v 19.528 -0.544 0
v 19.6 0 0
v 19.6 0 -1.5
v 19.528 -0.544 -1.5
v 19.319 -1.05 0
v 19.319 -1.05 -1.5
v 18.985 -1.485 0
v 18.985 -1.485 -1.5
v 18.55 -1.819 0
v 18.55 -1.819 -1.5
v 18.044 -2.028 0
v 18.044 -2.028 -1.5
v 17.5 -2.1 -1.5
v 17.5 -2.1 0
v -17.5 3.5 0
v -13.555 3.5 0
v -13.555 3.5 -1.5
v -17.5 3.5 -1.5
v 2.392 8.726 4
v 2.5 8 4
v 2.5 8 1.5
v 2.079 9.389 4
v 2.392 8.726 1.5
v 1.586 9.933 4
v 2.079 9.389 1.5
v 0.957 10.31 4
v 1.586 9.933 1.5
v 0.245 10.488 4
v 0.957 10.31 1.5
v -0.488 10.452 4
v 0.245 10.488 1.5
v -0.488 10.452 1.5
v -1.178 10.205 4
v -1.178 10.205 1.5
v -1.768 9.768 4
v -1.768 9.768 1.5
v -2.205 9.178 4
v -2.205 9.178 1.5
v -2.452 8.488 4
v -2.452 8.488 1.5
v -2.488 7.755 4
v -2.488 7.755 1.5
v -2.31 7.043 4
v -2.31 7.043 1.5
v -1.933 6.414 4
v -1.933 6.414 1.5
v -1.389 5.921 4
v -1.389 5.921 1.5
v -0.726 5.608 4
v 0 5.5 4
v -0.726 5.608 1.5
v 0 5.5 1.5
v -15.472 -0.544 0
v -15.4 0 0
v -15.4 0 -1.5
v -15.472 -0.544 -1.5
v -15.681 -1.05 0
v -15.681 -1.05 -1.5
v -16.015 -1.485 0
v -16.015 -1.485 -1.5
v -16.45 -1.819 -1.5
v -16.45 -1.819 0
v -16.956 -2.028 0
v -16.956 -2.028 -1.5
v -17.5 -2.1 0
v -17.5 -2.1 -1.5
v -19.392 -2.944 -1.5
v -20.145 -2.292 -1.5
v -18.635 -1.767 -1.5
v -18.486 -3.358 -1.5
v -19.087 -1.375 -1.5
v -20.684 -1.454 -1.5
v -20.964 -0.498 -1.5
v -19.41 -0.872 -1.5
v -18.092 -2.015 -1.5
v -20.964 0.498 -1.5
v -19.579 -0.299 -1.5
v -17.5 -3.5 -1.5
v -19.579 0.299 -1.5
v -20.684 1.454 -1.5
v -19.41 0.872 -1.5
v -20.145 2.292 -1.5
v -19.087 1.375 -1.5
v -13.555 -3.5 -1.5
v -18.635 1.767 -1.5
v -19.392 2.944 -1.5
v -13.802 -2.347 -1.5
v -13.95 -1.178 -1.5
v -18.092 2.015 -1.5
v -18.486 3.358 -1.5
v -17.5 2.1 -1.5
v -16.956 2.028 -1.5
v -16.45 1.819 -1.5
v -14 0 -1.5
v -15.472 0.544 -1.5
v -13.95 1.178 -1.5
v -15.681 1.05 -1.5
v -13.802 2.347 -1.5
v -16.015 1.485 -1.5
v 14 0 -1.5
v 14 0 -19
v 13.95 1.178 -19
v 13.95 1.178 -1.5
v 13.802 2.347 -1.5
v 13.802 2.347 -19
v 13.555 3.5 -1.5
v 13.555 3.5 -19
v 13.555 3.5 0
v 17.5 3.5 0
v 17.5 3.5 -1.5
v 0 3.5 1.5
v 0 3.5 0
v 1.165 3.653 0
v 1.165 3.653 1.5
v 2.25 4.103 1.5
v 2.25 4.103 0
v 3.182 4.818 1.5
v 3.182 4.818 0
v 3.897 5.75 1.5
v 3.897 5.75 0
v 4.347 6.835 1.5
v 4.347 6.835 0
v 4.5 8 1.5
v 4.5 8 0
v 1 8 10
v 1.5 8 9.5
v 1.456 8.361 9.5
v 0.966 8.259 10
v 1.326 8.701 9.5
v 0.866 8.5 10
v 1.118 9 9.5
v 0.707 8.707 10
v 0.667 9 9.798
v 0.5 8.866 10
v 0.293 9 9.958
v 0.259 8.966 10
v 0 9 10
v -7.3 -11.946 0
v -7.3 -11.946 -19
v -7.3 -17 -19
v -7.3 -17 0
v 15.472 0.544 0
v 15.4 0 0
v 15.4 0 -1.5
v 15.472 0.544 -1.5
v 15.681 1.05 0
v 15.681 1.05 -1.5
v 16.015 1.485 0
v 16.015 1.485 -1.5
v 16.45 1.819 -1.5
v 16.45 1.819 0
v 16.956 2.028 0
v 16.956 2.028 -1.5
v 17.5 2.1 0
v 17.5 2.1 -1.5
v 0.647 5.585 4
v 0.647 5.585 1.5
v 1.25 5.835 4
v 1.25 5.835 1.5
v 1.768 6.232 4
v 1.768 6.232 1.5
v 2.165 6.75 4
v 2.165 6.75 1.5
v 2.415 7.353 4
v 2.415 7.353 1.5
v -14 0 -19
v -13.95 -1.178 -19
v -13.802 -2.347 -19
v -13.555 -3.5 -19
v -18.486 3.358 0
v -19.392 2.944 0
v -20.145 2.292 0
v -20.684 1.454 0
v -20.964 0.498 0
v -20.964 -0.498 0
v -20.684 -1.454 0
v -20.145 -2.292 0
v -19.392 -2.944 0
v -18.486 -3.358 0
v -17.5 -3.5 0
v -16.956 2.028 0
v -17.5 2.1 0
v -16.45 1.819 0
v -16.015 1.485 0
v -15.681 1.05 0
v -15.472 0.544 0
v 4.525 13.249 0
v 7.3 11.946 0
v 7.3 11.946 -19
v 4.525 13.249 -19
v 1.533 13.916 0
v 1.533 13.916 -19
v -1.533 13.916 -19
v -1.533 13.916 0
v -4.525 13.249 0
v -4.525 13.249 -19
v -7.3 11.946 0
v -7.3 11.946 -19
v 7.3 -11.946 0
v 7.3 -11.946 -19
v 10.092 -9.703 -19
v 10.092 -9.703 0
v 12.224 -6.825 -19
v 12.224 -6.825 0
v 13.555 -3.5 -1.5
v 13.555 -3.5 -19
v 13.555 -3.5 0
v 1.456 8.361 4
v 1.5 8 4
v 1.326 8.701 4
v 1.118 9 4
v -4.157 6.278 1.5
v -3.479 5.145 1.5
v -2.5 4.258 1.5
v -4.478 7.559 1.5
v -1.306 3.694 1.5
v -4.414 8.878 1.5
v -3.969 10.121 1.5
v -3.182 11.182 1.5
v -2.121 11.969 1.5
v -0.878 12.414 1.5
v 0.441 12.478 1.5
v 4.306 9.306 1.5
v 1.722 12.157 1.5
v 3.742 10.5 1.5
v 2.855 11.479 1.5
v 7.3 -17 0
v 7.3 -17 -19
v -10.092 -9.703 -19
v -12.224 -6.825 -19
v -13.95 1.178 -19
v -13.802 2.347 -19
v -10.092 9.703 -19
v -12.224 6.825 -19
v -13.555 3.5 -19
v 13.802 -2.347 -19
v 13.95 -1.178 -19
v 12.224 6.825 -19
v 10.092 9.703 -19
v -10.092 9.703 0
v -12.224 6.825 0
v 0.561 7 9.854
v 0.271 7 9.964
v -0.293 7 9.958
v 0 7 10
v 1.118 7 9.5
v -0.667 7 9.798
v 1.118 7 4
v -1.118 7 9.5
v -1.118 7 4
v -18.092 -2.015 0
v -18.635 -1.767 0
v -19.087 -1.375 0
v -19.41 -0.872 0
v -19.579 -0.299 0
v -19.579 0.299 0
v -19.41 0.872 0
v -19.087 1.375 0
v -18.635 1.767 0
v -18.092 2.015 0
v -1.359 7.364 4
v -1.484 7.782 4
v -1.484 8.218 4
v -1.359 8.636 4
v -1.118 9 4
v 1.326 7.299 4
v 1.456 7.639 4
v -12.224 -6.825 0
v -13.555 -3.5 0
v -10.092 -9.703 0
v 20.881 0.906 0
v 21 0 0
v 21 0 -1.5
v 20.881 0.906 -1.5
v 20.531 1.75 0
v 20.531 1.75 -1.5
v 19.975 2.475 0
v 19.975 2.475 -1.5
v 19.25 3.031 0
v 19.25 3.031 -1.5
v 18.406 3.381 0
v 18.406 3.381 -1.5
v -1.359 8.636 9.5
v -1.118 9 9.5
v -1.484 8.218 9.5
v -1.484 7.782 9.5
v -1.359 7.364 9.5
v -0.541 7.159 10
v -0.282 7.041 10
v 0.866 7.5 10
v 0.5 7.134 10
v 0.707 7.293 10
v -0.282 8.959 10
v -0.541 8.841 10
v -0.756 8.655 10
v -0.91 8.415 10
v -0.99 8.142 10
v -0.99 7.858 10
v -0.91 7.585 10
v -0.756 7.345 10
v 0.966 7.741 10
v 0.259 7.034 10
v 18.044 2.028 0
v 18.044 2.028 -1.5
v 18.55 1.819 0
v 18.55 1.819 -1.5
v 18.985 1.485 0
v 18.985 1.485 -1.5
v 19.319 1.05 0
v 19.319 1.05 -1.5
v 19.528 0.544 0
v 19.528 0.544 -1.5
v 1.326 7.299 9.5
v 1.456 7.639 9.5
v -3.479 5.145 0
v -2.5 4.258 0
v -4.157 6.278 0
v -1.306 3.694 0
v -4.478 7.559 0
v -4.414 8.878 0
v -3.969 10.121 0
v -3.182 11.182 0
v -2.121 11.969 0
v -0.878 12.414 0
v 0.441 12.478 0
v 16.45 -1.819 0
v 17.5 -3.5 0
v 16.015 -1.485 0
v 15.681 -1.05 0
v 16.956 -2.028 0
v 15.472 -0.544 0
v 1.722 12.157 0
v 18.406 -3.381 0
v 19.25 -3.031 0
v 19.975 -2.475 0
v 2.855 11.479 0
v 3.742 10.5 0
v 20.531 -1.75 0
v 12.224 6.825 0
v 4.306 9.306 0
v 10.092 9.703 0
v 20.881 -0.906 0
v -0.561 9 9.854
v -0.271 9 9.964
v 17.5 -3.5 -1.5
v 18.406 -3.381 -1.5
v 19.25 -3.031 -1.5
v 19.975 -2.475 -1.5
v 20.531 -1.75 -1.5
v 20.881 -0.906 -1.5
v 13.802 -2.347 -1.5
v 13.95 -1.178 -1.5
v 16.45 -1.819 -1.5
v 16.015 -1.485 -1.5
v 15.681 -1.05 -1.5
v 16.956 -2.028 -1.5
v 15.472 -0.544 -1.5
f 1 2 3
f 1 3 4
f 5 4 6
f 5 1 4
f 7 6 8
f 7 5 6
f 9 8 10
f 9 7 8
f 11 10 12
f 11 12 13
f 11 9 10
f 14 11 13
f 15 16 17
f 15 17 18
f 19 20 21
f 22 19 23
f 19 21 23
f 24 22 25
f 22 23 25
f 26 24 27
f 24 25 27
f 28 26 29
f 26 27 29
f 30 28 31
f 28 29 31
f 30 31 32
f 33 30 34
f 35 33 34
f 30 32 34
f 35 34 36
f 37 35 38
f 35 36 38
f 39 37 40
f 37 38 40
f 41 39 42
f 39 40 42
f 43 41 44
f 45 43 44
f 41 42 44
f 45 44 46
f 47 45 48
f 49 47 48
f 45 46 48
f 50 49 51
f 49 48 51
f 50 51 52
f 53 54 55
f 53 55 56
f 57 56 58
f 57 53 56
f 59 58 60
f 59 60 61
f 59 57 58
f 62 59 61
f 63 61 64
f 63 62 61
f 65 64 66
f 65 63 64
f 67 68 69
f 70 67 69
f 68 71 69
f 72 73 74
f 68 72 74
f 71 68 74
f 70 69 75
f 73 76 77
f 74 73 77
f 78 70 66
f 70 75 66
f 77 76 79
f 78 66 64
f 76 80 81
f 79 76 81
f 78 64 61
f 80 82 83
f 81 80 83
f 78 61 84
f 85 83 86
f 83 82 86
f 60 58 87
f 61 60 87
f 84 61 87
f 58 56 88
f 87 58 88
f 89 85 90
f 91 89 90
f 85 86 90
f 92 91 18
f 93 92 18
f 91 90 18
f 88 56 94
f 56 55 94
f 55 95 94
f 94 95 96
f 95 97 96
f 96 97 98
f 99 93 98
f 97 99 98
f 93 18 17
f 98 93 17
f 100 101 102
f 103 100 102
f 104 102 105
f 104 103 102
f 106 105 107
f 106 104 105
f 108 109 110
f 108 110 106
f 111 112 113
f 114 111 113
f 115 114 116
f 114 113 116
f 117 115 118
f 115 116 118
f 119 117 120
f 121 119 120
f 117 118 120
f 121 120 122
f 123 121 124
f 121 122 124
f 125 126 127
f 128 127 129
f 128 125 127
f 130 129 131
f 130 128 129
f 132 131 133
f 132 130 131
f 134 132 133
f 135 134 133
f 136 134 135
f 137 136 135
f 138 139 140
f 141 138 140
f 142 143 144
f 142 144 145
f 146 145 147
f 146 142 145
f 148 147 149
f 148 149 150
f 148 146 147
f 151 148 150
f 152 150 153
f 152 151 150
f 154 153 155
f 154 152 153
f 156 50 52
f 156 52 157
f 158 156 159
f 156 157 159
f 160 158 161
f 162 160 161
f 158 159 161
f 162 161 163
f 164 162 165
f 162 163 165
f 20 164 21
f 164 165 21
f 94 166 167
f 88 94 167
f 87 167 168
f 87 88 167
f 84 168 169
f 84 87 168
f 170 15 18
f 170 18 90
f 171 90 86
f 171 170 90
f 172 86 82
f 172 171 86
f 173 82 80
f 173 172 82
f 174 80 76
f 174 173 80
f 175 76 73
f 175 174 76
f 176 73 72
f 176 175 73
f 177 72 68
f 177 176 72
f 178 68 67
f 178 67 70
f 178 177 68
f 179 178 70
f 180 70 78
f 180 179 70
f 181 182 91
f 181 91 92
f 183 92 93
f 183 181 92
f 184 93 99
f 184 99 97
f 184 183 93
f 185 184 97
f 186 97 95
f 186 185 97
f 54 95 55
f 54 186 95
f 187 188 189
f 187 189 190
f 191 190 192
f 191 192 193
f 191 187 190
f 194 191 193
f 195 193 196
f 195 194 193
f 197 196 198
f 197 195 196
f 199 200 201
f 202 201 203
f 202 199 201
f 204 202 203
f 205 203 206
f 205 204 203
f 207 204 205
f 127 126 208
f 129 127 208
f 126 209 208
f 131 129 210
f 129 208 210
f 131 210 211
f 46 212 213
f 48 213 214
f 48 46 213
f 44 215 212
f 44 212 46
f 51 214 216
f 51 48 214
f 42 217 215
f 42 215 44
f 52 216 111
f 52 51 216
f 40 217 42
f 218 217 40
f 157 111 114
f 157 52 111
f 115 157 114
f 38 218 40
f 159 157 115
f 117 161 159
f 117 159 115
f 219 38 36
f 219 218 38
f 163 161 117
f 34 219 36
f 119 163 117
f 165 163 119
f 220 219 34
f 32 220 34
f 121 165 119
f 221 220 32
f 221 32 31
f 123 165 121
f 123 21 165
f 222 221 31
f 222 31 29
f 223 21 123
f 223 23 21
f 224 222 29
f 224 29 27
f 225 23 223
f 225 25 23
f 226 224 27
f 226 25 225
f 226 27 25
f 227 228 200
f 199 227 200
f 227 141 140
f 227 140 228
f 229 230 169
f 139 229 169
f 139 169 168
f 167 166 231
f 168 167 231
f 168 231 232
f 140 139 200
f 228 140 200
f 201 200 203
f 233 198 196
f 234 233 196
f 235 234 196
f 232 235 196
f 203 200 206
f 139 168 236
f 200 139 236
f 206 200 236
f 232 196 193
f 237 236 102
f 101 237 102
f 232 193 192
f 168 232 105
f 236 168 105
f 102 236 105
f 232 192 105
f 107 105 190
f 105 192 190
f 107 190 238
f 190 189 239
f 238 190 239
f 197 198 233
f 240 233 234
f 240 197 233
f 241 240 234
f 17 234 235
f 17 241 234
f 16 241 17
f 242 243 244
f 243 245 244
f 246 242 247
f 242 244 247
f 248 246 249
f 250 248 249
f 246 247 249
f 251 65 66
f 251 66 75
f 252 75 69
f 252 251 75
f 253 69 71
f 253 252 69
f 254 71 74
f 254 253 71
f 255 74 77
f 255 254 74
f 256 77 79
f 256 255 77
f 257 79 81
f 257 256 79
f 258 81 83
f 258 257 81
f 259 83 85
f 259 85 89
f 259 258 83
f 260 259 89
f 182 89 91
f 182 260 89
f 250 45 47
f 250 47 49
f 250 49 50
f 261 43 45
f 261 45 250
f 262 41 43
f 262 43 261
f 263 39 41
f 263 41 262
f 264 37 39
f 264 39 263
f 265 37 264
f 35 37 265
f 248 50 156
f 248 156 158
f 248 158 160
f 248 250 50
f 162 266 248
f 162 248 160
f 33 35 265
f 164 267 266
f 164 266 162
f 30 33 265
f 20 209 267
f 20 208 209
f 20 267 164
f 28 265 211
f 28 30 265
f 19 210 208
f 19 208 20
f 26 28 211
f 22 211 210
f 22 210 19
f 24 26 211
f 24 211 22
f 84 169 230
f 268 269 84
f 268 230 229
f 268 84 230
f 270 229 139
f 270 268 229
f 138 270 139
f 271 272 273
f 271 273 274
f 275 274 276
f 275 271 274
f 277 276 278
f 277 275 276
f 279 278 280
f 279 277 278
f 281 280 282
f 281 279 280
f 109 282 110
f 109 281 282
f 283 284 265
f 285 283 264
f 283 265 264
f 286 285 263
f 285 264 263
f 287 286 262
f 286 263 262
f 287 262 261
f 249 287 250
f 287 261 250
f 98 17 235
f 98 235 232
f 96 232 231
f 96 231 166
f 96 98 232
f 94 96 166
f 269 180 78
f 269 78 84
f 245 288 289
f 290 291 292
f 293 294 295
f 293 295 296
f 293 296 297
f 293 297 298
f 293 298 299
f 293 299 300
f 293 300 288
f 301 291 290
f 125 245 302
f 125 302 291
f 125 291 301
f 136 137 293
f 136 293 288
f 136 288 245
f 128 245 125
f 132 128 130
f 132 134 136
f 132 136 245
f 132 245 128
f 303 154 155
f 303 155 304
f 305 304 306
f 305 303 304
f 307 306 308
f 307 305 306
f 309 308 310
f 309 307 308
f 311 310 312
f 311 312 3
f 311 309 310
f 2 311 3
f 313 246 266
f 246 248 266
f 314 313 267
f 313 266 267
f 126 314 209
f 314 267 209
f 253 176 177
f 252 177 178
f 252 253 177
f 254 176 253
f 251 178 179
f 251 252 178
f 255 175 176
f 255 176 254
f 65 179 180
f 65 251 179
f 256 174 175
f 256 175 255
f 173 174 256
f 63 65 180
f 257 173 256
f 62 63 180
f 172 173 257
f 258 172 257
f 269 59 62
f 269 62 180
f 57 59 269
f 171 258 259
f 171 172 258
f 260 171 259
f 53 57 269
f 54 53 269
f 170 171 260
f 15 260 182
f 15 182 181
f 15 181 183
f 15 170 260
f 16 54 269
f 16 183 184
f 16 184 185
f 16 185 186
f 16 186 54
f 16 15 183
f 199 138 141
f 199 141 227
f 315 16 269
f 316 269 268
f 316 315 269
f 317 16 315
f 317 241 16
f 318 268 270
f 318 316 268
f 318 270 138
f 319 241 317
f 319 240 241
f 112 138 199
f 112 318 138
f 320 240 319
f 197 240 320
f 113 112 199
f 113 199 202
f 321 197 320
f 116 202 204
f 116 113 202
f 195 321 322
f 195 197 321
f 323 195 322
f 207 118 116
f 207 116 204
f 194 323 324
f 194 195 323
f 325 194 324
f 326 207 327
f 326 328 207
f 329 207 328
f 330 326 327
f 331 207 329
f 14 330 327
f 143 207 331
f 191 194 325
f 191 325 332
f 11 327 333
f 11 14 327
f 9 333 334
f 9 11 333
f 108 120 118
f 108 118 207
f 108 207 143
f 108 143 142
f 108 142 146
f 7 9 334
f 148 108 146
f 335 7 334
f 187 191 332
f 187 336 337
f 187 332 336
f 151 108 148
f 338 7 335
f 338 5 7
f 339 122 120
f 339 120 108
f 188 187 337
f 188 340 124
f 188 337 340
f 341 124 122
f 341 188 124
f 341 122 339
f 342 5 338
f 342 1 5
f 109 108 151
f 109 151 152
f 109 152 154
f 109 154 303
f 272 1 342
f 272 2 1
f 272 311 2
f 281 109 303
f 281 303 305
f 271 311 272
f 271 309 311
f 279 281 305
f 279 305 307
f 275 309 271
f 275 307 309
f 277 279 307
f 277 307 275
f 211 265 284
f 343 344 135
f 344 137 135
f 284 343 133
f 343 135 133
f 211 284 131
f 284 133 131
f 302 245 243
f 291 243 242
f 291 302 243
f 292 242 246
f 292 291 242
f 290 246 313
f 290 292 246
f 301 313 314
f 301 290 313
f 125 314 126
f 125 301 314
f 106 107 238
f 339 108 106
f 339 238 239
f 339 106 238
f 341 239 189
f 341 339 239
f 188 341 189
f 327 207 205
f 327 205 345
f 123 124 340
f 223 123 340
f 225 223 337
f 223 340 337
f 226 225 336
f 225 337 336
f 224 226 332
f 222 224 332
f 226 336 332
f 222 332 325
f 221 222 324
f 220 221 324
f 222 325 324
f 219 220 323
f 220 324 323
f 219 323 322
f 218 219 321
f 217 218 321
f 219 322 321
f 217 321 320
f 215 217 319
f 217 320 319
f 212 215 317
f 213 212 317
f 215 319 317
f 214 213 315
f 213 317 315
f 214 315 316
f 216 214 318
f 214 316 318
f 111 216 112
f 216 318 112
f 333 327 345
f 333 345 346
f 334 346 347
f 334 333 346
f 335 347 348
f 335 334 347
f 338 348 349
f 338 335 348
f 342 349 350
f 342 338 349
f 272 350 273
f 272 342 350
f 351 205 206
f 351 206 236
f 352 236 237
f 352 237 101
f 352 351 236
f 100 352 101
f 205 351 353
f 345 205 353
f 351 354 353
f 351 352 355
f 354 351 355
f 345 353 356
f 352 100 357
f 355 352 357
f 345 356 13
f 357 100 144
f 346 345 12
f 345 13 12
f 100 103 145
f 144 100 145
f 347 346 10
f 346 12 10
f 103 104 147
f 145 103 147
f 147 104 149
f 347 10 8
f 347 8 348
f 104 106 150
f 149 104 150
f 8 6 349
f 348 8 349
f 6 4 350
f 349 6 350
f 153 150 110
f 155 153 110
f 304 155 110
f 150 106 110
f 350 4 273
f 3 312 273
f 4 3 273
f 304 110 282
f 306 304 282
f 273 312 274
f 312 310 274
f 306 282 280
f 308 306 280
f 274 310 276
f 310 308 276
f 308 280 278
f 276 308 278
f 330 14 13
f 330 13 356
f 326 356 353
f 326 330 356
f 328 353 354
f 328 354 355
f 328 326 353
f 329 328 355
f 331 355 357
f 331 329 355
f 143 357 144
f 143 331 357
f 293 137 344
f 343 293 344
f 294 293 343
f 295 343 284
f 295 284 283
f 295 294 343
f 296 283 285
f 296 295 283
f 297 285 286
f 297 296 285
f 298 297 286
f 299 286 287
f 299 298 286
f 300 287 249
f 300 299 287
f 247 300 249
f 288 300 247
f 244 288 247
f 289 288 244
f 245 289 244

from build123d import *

# Parameters (mm, degrees)
F0_W     = 7.3
F0_H     = 3.5
F1_DEPTH = 19
F2_DEPTH = 1.5
F3_DEPTH = 10
F4_DEPTH = 4
F5_DEPTH = 1.5
F6_SIZE  = 0.5
F8_DEPTH = 6


with BuildPart() as f1:
    # F0 (on Top) → F1 (new body)
    with BuildSketch(Plane.XY):
        with BuildLine():
            ThreePointArc((7.3, -11.9461290802), (11.250406053, -8.3323684294), (13.5554417117, -3.5))
            Line((13.5554417117, -3.5), (7.3, -3.5))
            Line((7.3, -3.5), (7.3, -11.9461290802))
        make_face()
        with BuildLine():
            ThreePointArc((-7.3, -11.9461290802), (0, -14), (7.3, -11.9461290802))
            Line((7.3, -11.9461290802), (7.3, -3.5))
            Line((7.3, -3.5), (-7.3, -3.5))
            Line((-7.3, -3.5), (-7.3, -11.9461290802))
        make_face()
        with BuildLine():
            ThreePointArc((-13.5554417117, -3.5), (-11.250406053, -8.3323684294), (-7.3, -11.9461290802))
            Line((-7.3, -11.9461290802), (-7.3, -3.5))
            Line((-7.3, -3.5), (-13.5554417117, -3.5))
        make_face()
        with BuildLine():
            Line((-13.5554417117, -3.5), (-7.3, -3.5))
            Line((-7.3, -3.5), (-7.3, 0))
            Line((-7.3, 0), (-14, 0))
            ThreePointArc((-14, 0), (-13.8884157477, -1.7640600948), (-13.5554417117, -3.5))
        make_face()
        with BuildLine():
            Line((-14, 0), (-7.3, 0))
            Line((-7.3, 0), (-7.3, 3.5))
            Line((-7.3, 3.5), (-13.5554417117, 3.5))
            ThreePointArc((-13.5554417117, 3.5), (-13.8884157477, 1.7640600948), (-14, 0))
        make_face()
        with BuildLine():
            Line((-7.3, 3.5), (-7.3, 11.9461290802))
            ThreePointArc((-7.3, 11.9461290802), (-11.250406053, 8.3323684294), (-13.5554417117, 3.5))
            Line((-13.5554417117, 3.5), (-7.3, 3.5))
        make_face()
        with BuildLine():
            Line((7.3, 3.5), (7.3, 11.9461290802))
            ThreePointArc((7.3, 11.9461290802), (0, 14), (-7.3, 11.9461290802))
            Line((-7.3, 11.9461290802), (-7.3, 3.5))
            Line((-7.3, 3.5), (0, 3.5))
            Line((0, 3.5), (7.3, 3.5))
        make_face()
        with BuildLine():
            ThreePointArc((4.5, 8), (3.1819805153, 4.8180194847), (0, 3.5))
            ThreePointArc((0, 3.5), (-3.1819805153, 11.1819805153), (4.5, 8))
        make_face(mode=Mode.SUBTRACT)
        with BuildLine():
            Line((7.3, 3.5), (13.5554417117, 3.5))
            ThreePointArc((13.5554417117, 3.5), (11.250406053, 8.3323684294), (7.3, 11.9461290802))
            Line((7.3, 11.9461290802), (7.3, 3.5))
        make_face()
        with BuildLine():
            Line((7.3, 0), (14, 0))
            ThreePointArc((14, 0), (13.8884157477, 1.7640600948), (13.5554417117, 3.5))
            Line((13.5554417117, 3.5), (7.3, 3.5))
            Line((7.3, 3.5), (7.3, 0))
        make_face()
        with BuildLine():
            ThreePointArc((13.5554417117, -3.5), (13.8884157477, -1.7640600948), (14, 0))
            Line((14, 0), (7.3, 0))
            Line((7.3, 0), (7.3, -3.5))
            Line((7.3, -3.5), (13.5554417117, -3.5))
        make_face()
        Polygon((7.3, -3.5), (7.3, 0), (0, 0), (-7.3, 0), (-7.3, -3.5), align=None)
        with Locations((3.65, 1.75)):
            Rectangle(F0_W, F0_H)
        with Locations((-3.65, 1.75)):
            Rectangle(F0_W, F0_H)
        with BuildLine():
            ThreePointArc((4.5, 8), (-3.1819805153, 11.1819805153), (0, 3.5))
            ThreePointArc((0, 3.5), (3.1819805153, 4.8180194847), (4.5, 8))
        make_face()
        with BuildLine():
            ThreePointArc((2.5, 8), (1.767766953, 6.232233047), (0, 5.5))
            ThreePointArc((0, 5.5), (-1.767766953, 9.767766953), (2.5, 8))
        make_face(mode=Mode.SUBTRACT)
        with BuildLine():
            ThreePointArc((2.5, 8), (-1.767766953, 9.767766953), (0, 5.5))
            ThreePointArc((0, 5.5), (1.767766953, 6.232233047), (2.5, 8))
        make_face()
        with BuildLine():
            ThreePointArc((1.5, 8), (1.0606601718, 6.9393398282), (0, 6.5))
            ThreePointArc((0, 6.5), (-1.0606601718, 9.0606601718), (1.5, 8))
        make_face(mode=Mode.SUBTRACT)
        with BuildLine():
            ThreePointArc((1.5, 8), (-1.0606601718, 9.0606601718), (0, 6.5))
            ThreePointArc((0, 6.5), (1.0606601718, 6.9393398282), (1.5, 8))
        make_face()
        with BuildLine():
            Line((7.3, -17), (7.3, -11.9461290802))
            ThreePointArc((7.3, -11.9461290802), (0, -14), (-7.3, -11.9461290802))
            Line((-7.3, -11.9461290802), (-7.3, -17))
            Line((-7.3, -17), (7.3, -17))
        make_face()
    extrude(amount=-F1_DEPTH)

    # F0 (on Top) → F2 (join)
    with BuildSketch(Plane.XY):
        with BuildLine():
            Line((-17.5, 2.1), (-17.5, 3.5))
            ThreePointArc((-17.5, 3.5), (-21, 0), (-17.5, -3.5))
            Line((-17.5, -3.5), (-17.5, -2.1))
            ThreePointArc((-17.5, -2.1), (-19.6, 0), (-17.5, 2.1))
        make_face()
        with BuildLine():
            ThreePointArc((-17.5, -3.5), (-15.0251262658, -2.4748737342), (-14, 0))
            Line((-14, 0), (-15.4, 0))
            ThreePointArc((-15.4, 0), (-16.0150757595, -1.4849242405), (-17.5, -2.1))
            Line((-17.5, -2.1), (-17.5, -3.5))
        make_face()
        with BuildLine():
            Line((-17.5, -3.5), (-13.5554417117, -3.5))
            ThreePointArc((-13.5554417117, -3.5), (-13.8884157477, -1.7640600948), (-14, 0))
            ThreePointArc((-14, 0), (-15.0251262658, -2.4748737342), (-17.5, -3.5))
        make_face()
        with BuildLine():
            Line((-15.4, 0), (-14, 0))
            ThreePointArc((-14, 0), (-15.0251262658, 2.4748737342), (-17.5, 3.5))
            Line((-17.5, 3.5), (-17.5, 2.1))
            ThreePointArc((-17.5, 2.1), (-16.0150757595, 1.4849242405), (-15.4, 0))
        make_face()
        with BuildLine():
            ThreePointArc((-14, 0), (-13.8884157477, 1.7640600948), (-13.5554417117, 3.5))
            Line((-13.5554417117, 3.5), (-17.5, 3.5))
            ThreePointArc((-17.5, 3.5), (-15.0251262658, 2.4748737342), (-14, 0))
        make_face()
        with BuildLine():
            ThreePointArc((13.5554417117, 3.5), (13.8884157477, 1.7640600948), (14, 0))
            ThreePointArc((14, 0), (15.0251262658, 2.4748737342), (17.5, 3.5))
            Line((17.5, 3.5), (13.5554417117, 3.5))
        make_face()
        with BuildLine():
            ThreePointArc((17.5, -3.5), (15.0251262658, -2.4748737342), (14, 0))
            ThreePointArc((14, 0), (13.8884157477, -1.7640600948), (13.5554417117, -3.5))
            Line((13.5554417117, -3.5), (17.5, -3.5))
        make_face()
        with BuildLine():
            ThreePointArc((21, 0), (19.9748737342, 2.4748737342), (17.5, 3.5))
            Line((17.5, 3.5), (17.5, 2.1))
            ThreePointArc((17.5, 2.1), (18.9849242405, 1.4849242405), (19.6, 0))
            ThreePointArc((19.6, 0), (18.9849242405, -1.4849242405), (17.5, -2.1))
            Line((17.5, -2.1), (17.5, -3.5))
            ThreePointArc((17.5, -3.5), (19.9748737342, -2.4748737342), (21, 0))
        make_face()
        with BuildLine():
            Line((15.4, 0), (14, 0))
            ThreePointArc((14, 0), (15.0251262658, -2.4748737342), (17.5, -3.5))
            Line((17.5, -3.5), (17.5, -2.1))
            ThreePointArc((17.5, -2.1), (16.0150757595, -1.4849242405), (15.4, 0))
        make_face()
        with BuildLine():
            ThreePointArc((17.5, 3.5), (15.0251262658, 2.4748737342), (14, 0))
            Line((14, 0), (15.4, 0))
            ThreePointArc((15.4, 0), (16.0150757595, 1.4849242405), (17.5, 2.1))
            Line((17.5, 2.1), (17.5, 3.5))
        make_face()
    extrude(amount=-F2_DEPTH)

    # F0 (on Top) → F3 (join)
    with BuildSketch(Plane.XY):
        with BuildLine():
            ThreePointArc((1.5, 8), (-1.0606601718, 9.0606601718), (0, 6.5))
            ThreePointArc((0, 6.5), (1.0606601718, 6.9393398282), (1.5, 8))
        make_face()
    extrude(amount=F3_DEPTH)

    # F0 (on Top) → F4 (join)
    with BuildSketch(Plane.XY):
        with BuildLine():
            ThreePointArc((2.5, 8), (-1.767766953, 9.767766953), (0, 5.5))
            ThreePointArc((0, 5.5), (1.767766953, 6.232233047), (2.5, 8))
        make_face()
        with BuildLine():
            ThreePointArc((1.5, 8), (1.0606601718, 6.9393398282), (0, 6.5))
            ThreePointArc((0, 6.5), (-1.0606601718, 9.0606601718), (1.5, 8))
        make_face(mode=Mode.SUBTRACT)
    extrude(amount=F4_DEPTH)

    # F0 (on Top) → F5 (join)
    with BuildSketch(Plane.XY):
        with BuildLine():
            ThreePointArc((4.5, 8), (-3.1819805153, 11.1819805153), (0, 3.5))
            ThreePointArc((0, 3.5), (3.1819805153, 4.8180194847), (4.5, 8))
        make_face()
        with BuildLine():
            ThreePointArc((2.5, 8), (1.767766953, 6.232233047), (0, 5.5))
            ThreePointArc((0, 5.5), (-1.767766953, 9.767766953), (2.5, 8))
        make_face(mode=Mode.SUBTRACT)
    extrude(amount=F5_DEPTH)

    # F6
    f6_edges = [f1.edges().sort_by_distance(p)[0] for p in [
        (0, 9.5, 10),
    ]]
    chamfer(f6_edges, length=F6_SIZE)

    # F7 (on face) → F8 (cut)
    with BuildSketch(Plane.XY.offset(10)):
        Polygon((0, 9), (1.5, 9), (1.5, 9.5), (-1.5, 9.5), (-1.5, 9), align=None)
        Polygon((1.5, 6.5), (1.5, 7), (0, 7), (-1.5, 7), (-1.5, 6.5), align=None)
    extrude(amount=-F8_DEPTH, mode=Mode.SUBTRACT)


solid = f1.part
